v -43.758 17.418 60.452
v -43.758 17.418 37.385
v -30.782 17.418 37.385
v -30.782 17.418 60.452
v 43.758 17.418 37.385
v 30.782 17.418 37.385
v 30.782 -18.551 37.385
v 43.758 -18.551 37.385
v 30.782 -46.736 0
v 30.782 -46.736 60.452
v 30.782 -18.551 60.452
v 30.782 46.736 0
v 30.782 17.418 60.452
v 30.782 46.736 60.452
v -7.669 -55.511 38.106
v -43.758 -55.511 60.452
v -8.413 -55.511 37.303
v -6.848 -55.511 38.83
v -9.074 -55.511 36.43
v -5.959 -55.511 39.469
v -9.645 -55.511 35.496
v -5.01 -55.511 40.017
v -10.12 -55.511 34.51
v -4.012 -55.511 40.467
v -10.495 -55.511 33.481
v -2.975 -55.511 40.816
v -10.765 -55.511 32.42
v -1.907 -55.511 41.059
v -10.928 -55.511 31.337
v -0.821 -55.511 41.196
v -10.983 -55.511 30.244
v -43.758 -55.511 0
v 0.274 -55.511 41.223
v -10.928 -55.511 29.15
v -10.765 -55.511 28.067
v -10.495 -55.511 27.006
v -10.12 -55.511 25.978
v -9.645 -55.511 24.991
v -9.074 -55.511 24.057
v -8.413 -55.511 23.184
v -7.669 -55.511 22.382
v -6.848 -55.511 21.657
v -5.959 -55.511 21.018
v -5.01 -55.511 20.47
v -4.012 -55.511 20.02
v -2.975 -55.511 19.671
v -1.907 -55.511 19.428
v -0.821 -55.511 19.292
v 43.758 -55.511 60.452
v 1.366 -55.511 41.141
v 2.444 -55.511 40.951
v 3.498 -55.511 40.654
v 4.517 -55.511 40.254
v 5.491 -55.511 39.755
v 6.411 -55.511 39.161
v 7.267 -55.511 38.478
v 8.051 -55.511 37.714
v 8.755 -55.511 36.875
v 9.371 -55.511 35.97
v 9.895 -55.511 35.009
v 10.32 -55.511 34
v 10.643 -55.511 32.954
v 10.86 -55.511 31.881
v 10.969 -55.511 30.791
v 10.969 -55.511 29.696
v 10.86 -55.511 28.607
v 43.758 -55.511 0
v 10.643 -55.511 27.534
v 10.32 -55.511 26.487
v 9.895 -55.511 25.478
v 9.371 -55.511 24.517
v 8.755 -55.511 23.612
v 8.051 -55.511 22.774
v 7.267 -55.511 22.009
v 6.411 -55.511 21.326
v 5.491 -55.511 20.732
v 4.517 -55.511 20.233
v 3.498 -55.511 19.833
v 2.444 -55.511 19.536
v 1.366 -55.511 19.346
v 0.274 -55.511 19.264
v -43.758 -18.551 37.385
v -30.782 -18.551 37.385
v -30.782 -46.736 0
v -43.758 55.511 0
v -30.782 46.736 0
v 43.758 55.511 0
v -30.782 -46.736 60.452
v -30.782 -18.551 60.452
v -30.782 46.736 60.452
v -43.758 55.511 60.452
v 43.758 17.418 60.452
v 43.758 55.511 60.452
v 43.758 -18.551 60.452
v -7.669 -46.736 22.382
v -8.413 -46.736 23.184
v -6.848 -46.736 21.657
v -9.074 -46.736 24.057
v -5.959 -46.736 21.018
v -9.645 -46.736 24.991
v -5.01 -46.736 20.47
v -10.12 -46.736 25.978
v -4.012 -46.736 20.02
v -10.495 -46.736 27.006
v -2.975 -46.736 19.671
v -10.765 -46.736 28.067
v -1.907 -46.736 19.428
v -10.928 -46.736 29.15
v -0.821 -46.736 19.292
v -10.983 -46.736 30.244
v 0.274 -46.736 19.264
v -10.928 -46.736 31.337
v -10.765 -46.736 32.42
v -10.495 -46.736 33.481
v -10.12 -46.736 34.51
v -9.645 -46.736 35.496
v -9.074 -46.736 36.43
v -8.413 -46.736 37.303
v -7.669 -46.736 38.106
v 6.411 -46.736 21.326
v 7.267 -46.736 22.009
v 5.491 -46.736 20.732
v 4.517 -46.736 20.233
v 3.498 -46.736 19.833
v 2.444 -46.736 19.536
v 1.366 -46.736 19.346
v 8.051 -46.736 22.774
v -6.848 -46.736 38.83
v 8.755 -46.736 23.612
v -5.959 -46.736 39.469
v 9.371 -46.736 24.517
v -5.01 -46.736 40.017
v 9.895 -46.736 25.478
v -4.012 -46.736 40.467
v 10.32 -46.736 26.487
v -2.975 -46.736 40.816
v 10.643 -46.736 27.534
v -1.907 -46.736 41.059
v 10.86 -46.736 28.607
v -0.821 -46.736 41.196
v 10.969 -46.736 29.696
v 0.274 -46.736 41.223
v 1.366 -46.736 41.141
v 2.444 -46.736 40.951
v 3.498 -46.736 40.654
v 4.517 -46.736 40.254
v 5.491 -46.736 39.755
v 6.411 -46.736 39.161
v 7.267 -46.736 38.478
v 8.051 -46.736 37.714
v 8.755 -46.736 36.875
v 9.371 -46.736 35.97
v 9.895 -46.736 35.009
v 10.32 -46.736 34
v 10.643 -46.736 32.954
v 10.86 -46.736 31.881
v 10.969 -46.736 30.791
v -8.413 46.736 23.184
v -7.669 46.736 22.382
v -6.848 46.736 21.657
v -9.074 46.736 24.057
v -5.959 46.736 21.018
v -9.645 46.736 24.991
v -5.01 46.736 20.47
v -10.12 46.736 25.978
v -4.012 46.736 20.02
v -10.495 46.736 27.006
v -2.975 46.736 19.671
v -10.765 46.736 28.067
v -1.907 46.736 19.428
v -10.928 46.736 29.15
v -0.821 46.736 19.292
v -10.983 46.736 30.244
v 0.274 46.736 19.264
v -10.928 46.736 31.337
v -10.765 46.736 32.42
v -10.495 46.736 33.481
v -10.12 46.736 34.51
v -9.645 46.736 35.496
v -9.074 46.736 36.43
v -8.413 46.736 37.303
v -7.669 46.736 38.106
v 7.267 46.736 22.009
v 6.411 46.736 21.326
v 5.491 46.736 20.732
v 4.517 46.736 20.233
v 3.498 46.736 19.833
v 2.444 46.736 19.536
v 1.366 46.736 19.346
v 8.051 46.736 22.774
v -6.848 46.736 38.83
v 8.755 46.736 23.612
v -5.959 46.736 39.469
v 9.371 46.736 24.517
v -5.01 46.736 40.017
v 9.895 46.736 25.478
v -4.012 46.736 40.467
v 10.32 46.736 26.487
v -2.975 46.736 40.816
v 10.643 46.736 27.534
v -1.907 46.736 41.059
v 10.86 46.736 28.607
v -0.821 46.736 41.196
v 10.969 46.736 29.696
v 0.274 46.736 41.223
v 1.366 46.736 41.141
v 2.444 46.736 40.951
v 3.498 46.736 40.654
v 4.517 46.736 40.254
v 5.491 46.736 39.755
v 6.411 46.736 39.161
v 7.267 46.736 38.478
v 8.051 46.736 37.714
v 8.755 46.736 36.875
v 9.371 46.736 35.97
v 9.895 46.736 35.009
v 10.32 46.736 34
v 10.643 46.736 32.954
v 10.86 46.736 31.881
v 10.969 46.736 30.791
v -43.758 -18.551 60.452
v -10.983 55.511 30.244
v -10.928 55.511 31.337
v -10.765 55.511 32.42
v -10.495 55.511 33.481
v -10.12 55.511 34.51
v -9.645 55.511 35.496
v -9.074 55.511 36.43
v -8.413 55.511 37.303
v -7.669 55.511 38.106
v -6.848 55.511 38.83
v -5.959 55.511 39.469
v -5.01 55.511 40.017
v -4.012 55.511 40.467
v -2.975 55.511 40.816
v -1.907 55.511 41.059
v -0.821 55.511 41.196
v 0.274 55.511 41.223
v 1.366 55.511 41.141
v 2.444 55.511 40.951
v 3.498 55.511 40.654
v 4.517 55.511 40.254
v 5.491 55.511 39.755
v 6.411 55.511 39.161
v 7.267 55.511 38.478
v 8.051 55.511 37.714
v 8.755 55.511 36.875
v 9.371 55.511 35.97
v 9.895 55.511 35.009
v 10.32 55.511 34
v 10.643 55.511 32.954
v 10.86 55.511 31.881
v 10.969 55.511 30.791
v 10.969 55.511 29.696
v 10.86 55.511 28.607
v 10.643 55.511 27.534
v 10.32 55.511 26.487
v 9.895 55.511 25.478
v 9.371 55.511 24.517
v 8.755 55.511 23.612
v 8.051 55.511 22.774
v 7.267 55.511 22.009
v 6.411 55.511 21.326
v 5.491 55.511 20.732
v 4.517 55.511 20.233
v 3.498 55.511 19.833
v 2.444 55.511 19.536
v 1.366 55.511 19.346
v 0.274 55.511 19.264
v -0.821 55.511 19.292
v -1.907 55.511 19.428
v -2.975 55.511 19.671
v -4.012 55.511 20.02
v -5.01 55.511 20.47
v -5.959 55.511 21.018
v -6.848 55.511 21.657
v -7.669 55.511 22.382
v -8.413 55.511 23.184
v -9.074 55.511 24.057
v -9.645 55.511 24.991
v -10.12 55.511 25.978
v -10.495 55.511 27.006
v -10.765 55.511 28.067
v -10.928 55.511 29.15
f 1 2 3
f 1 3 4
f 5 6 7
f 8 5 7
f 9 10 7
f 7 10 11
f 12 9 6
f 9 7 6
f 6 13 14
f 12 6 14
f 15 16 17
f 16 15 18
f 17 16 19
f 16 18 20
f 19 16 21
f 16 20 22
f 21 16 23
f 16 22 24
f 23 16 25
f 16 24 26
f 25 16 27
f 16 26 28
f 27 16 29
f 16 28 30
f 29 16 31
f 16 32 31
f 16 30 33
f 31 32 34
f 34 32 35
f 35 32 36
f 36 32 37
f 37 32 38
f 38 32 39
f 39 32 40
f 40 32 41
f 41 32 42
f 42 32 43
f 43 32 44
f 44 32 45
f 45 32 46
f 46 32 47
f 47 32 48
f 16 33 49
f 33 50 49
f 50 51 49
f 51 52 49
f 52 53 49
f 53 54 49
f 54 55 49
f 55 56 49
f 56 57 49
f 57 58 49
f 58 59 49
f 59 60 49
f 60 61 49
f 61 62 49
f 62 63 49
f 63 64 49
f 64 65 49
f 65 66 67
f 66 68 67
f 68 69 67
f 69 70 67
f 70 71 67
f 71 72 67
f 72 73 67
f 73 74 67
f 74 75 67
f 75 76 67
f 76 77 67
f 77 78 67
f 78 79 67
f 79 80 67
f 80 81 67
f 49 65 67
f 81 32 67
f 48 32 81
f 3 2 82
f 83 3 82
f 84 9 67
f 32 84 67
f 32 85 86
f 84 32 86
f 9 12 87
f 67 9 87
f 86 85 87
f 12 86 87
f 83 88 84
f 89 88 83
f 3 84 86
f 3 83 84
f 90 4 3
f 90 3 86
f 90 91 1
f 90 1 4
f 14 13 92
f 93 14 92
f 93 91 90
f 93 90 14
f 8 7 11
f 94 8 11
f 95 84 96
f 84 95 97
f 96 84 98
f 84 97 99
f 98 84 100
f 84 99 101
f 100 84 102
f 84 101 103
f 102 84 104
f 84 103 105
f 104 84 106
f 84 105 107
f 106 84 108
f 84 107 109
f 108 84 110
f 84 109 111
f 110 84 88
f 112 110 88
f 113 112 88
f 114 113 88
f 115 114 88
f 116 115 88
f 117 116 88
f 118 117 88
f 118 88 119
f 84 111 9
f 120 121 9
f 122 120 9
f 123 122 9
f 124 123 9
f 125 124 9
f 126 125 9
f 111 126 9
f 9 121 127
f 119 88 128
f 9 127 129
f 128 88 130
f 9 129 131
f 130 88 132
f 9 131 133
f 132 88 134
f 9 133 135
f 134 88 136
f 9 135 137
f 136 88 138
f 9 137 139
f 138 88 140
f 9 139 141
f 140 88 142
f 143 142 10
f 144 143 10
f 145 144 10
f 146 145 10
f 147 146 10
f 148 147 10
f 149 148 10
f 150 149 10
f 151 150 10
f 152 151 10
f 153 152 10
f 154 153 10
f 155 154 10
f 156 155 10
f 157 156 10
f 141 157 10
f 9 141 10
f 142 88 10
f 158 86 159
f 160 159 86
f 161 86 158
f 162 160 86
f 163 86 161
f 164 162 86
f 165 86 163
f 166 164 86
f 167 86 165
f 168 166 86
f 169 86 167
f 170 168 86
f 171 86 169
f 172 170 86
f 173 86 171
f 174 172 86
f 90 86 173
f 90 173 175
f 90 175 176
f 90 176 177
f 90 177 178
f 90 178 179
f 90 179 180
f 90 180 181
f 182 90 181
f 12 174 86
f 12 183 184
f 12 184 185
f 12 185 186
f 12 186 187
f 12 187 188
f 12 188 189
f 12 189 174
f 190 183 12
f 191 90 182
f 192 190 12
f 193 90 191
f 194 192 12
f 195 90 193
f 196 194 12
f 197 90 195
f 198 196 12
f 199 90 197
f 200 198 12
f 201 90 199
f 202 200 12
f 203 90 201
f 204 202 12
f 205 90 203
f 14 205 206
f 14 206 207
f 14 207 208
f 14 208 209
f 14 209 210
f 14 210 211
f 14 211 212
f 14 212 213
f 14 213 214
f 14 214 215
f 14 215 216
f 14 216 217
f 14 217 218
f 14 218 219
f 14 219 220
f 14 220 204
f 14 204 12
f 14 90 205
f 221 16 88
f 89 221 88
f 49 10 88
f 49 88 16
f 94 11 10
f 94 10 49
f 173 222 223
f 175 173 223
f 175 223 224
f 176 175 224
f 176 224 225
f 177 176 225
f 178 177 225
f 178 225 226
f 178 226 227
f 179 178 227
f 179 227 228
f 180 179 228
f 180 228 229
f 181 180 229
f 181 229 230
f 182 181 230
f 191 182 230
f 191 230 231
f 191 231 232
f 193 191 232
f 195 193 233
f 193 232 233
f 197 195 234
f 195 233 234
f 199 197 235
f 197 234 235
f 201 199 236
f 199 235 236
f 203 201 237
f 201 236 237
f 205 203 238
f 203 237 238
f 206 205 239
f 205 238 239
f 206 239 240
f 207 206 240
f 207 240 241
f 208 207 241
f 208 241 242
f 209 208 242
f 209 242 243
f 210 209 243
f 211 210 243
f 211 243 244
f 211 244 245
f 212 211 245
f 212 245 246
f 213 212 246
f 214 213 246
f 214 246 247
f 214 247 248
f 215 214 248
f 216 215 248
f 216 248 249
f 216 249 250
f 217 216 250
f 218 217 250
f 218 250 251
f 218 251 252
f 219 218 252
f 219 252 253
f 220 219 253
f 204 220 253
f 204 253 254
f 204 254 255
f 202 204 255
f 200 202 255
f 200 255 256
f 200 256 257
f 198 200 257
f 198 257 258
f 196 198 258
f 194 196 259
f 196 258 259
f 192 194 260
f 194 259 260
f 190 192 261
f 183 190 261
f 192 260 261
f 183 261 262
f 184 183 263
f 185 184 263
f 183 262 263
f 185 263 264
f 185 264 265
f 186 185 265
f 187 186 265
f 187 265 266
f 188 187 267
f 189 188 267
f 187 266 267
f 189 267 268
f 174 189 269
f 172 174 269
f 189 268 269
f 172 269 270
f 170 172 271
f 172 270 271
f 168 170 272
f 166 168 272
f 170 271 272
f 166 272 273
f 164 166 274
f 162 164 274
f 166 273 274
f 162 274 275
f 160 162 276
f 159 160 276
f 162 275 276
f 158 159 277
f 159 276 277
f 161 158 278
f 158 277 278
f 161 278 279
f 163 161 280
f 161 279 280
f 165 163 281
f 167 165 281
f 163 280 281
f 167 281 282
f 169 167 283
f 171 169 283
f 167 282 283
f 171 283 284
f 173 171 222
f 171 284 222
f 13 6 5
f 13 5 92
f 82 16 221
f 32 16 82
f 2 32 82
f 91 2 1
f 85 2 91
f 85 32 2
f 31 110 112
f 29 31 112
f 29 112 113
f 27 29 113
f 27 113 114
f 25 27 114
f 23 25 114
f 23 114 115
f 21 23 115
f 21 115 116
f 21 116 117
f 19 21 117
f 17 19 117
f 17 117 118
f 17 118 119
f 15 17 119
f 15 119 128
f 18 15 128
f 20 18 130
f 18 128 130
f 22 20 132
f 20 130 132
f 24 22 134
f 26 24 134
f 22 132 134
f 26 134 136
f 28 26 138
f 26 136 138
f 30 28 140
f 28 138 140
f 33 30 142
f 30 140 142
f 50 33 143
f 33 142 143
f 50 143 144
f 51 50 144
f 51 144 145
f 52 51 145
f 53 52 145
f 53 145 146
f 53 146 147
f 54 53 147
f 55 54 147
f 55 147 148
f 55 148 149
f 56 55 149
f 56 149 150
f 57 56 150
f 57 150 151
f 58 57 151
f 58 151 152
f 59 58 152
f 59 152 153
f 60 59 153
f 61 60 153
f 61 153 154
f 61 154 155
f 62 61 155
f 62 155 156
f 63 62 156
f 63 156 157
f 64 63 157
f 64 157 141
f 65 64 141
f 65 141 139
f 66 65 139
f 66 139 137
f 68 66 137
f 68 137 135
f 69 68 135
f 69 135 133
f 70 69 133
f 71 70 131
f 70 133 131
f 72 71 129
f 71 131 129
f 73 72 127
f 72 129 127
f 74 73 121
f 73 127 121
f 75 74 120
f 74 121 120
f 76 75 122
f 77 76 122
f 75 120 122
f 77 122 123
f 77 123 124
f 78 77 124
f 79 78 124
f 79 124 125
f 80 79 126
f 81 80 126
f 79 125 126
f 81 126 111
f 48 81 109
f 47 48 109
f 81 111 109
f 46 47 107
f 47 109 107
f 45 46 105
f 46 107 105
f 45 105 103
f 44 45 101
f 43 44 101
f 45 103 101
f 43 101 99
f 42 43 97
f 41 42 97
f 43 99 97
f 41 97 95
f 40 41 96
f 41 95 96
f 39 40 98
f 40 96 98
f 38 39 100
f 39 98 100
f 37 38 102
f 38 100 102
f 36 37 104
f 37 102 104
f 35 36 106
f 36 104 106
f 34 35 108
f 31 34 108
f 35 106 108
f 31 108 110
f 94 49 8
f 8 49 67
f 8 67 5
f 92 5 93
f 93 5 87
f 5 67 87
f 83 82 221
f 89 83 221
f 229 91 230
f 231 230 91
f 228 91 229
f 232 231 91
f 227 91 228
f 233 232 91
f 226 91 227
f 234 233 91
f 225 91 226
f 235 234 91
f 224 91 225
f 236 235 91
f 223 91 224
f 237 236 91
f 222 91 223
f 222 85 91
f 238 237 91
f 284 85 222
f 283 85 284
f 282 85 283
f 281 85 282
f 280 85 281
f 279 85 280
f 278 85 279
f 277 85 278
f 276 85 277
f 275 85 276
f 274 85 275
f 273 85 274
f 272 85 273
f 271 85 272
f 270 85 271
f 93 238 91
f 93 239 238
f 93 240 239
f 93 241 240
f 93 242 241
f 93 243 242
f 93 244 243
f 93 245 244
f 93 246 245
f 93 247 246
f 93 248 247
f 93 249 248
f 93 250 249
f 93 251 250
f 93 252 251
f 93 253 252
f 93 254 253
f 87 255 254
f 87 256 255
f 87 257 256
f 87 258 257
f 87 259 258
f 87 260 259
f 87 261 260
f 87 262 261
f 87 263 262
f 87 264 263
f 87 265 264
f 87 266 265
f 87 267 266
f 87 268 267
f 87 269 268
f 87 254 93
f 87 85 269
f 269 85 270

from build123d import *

# Parameters (mm, degrees)
F0_W     = 87.5153616071
F0_H     = 111.0227331519
F1_DEPTH = 60.452
F2_W     = 61.5649223328
F2_H     = 93.4719592333
F3_DEPTH = 25.4
F4_DEPTH = 25.4
F5_DEPTH = 25.4
F6_R     = 10.9826729048
F7_DEPTH = 111.0237331519
F8_W     = 35.9690990299
F8_H     = 23.0667970557
F9_DEPTH = 87.5163616071


with BuildPart() as f1:
    # F0 (on Top) → F1 (new body)
    with BuildSketch(Plane.XY):
        Rectangle(F0_W, F0_H)
    extrude(amount=F1_DEPTH)

    # F2 (on face) → F3 (cut)
    with BuildSketch(Plane.XY.offset(60.452)):
        Rectangle(F2_W, F2_H)
    extrude(amount=-F3_DEPTH, mode=Mode.SUBTRACT)

    # F4 (cut): a face of the model
    f4_faces = [f1.faces().sort_by_distance(p)[0] for p in [
        (0, 0, 35.052),
    ]]
    extrude(f4_faces, amount=-F4_DEPTH, mode=Mode.SUBTRACT)

    # F5 (cut): a face of the model
    f5_faces = [f1.faces().sort_by_distance(p)[0] for p in [
        (0, 0, 9.652),
    ]]
    extrude(f5_faces, amount=-F5_DEPTH, mode=Mode.SUBTRACT)

    # F6 (on face) → F7 (cut, through all)
    with BuildSketch(Plane(origin=(0, 55.511366576, 0), x_dir=(-1, 0, 0), z_dir=(0, 1, 0))):
        with Locations((0, 30.2436631173)):
            Circle(F6_R)
    extrude(amount=-F7_DEPTH, mode=Mode.SUBTRACT)

    # F8 (on face) → F9 (cut, through all)
    with BuildSketch(Plane(origin=(-43.7576808035, 0, 0), x_dir=(0, -1, 0), z_dir=(-1, 0, 0))):
        with Locations((0.5664424971, 48.9186014721)):
            Rectangle(F8_W, F8_H)
    extrude(amount=-F9_DEPTH, mode=Mode.SUBTRACT)


solid = f1.part
